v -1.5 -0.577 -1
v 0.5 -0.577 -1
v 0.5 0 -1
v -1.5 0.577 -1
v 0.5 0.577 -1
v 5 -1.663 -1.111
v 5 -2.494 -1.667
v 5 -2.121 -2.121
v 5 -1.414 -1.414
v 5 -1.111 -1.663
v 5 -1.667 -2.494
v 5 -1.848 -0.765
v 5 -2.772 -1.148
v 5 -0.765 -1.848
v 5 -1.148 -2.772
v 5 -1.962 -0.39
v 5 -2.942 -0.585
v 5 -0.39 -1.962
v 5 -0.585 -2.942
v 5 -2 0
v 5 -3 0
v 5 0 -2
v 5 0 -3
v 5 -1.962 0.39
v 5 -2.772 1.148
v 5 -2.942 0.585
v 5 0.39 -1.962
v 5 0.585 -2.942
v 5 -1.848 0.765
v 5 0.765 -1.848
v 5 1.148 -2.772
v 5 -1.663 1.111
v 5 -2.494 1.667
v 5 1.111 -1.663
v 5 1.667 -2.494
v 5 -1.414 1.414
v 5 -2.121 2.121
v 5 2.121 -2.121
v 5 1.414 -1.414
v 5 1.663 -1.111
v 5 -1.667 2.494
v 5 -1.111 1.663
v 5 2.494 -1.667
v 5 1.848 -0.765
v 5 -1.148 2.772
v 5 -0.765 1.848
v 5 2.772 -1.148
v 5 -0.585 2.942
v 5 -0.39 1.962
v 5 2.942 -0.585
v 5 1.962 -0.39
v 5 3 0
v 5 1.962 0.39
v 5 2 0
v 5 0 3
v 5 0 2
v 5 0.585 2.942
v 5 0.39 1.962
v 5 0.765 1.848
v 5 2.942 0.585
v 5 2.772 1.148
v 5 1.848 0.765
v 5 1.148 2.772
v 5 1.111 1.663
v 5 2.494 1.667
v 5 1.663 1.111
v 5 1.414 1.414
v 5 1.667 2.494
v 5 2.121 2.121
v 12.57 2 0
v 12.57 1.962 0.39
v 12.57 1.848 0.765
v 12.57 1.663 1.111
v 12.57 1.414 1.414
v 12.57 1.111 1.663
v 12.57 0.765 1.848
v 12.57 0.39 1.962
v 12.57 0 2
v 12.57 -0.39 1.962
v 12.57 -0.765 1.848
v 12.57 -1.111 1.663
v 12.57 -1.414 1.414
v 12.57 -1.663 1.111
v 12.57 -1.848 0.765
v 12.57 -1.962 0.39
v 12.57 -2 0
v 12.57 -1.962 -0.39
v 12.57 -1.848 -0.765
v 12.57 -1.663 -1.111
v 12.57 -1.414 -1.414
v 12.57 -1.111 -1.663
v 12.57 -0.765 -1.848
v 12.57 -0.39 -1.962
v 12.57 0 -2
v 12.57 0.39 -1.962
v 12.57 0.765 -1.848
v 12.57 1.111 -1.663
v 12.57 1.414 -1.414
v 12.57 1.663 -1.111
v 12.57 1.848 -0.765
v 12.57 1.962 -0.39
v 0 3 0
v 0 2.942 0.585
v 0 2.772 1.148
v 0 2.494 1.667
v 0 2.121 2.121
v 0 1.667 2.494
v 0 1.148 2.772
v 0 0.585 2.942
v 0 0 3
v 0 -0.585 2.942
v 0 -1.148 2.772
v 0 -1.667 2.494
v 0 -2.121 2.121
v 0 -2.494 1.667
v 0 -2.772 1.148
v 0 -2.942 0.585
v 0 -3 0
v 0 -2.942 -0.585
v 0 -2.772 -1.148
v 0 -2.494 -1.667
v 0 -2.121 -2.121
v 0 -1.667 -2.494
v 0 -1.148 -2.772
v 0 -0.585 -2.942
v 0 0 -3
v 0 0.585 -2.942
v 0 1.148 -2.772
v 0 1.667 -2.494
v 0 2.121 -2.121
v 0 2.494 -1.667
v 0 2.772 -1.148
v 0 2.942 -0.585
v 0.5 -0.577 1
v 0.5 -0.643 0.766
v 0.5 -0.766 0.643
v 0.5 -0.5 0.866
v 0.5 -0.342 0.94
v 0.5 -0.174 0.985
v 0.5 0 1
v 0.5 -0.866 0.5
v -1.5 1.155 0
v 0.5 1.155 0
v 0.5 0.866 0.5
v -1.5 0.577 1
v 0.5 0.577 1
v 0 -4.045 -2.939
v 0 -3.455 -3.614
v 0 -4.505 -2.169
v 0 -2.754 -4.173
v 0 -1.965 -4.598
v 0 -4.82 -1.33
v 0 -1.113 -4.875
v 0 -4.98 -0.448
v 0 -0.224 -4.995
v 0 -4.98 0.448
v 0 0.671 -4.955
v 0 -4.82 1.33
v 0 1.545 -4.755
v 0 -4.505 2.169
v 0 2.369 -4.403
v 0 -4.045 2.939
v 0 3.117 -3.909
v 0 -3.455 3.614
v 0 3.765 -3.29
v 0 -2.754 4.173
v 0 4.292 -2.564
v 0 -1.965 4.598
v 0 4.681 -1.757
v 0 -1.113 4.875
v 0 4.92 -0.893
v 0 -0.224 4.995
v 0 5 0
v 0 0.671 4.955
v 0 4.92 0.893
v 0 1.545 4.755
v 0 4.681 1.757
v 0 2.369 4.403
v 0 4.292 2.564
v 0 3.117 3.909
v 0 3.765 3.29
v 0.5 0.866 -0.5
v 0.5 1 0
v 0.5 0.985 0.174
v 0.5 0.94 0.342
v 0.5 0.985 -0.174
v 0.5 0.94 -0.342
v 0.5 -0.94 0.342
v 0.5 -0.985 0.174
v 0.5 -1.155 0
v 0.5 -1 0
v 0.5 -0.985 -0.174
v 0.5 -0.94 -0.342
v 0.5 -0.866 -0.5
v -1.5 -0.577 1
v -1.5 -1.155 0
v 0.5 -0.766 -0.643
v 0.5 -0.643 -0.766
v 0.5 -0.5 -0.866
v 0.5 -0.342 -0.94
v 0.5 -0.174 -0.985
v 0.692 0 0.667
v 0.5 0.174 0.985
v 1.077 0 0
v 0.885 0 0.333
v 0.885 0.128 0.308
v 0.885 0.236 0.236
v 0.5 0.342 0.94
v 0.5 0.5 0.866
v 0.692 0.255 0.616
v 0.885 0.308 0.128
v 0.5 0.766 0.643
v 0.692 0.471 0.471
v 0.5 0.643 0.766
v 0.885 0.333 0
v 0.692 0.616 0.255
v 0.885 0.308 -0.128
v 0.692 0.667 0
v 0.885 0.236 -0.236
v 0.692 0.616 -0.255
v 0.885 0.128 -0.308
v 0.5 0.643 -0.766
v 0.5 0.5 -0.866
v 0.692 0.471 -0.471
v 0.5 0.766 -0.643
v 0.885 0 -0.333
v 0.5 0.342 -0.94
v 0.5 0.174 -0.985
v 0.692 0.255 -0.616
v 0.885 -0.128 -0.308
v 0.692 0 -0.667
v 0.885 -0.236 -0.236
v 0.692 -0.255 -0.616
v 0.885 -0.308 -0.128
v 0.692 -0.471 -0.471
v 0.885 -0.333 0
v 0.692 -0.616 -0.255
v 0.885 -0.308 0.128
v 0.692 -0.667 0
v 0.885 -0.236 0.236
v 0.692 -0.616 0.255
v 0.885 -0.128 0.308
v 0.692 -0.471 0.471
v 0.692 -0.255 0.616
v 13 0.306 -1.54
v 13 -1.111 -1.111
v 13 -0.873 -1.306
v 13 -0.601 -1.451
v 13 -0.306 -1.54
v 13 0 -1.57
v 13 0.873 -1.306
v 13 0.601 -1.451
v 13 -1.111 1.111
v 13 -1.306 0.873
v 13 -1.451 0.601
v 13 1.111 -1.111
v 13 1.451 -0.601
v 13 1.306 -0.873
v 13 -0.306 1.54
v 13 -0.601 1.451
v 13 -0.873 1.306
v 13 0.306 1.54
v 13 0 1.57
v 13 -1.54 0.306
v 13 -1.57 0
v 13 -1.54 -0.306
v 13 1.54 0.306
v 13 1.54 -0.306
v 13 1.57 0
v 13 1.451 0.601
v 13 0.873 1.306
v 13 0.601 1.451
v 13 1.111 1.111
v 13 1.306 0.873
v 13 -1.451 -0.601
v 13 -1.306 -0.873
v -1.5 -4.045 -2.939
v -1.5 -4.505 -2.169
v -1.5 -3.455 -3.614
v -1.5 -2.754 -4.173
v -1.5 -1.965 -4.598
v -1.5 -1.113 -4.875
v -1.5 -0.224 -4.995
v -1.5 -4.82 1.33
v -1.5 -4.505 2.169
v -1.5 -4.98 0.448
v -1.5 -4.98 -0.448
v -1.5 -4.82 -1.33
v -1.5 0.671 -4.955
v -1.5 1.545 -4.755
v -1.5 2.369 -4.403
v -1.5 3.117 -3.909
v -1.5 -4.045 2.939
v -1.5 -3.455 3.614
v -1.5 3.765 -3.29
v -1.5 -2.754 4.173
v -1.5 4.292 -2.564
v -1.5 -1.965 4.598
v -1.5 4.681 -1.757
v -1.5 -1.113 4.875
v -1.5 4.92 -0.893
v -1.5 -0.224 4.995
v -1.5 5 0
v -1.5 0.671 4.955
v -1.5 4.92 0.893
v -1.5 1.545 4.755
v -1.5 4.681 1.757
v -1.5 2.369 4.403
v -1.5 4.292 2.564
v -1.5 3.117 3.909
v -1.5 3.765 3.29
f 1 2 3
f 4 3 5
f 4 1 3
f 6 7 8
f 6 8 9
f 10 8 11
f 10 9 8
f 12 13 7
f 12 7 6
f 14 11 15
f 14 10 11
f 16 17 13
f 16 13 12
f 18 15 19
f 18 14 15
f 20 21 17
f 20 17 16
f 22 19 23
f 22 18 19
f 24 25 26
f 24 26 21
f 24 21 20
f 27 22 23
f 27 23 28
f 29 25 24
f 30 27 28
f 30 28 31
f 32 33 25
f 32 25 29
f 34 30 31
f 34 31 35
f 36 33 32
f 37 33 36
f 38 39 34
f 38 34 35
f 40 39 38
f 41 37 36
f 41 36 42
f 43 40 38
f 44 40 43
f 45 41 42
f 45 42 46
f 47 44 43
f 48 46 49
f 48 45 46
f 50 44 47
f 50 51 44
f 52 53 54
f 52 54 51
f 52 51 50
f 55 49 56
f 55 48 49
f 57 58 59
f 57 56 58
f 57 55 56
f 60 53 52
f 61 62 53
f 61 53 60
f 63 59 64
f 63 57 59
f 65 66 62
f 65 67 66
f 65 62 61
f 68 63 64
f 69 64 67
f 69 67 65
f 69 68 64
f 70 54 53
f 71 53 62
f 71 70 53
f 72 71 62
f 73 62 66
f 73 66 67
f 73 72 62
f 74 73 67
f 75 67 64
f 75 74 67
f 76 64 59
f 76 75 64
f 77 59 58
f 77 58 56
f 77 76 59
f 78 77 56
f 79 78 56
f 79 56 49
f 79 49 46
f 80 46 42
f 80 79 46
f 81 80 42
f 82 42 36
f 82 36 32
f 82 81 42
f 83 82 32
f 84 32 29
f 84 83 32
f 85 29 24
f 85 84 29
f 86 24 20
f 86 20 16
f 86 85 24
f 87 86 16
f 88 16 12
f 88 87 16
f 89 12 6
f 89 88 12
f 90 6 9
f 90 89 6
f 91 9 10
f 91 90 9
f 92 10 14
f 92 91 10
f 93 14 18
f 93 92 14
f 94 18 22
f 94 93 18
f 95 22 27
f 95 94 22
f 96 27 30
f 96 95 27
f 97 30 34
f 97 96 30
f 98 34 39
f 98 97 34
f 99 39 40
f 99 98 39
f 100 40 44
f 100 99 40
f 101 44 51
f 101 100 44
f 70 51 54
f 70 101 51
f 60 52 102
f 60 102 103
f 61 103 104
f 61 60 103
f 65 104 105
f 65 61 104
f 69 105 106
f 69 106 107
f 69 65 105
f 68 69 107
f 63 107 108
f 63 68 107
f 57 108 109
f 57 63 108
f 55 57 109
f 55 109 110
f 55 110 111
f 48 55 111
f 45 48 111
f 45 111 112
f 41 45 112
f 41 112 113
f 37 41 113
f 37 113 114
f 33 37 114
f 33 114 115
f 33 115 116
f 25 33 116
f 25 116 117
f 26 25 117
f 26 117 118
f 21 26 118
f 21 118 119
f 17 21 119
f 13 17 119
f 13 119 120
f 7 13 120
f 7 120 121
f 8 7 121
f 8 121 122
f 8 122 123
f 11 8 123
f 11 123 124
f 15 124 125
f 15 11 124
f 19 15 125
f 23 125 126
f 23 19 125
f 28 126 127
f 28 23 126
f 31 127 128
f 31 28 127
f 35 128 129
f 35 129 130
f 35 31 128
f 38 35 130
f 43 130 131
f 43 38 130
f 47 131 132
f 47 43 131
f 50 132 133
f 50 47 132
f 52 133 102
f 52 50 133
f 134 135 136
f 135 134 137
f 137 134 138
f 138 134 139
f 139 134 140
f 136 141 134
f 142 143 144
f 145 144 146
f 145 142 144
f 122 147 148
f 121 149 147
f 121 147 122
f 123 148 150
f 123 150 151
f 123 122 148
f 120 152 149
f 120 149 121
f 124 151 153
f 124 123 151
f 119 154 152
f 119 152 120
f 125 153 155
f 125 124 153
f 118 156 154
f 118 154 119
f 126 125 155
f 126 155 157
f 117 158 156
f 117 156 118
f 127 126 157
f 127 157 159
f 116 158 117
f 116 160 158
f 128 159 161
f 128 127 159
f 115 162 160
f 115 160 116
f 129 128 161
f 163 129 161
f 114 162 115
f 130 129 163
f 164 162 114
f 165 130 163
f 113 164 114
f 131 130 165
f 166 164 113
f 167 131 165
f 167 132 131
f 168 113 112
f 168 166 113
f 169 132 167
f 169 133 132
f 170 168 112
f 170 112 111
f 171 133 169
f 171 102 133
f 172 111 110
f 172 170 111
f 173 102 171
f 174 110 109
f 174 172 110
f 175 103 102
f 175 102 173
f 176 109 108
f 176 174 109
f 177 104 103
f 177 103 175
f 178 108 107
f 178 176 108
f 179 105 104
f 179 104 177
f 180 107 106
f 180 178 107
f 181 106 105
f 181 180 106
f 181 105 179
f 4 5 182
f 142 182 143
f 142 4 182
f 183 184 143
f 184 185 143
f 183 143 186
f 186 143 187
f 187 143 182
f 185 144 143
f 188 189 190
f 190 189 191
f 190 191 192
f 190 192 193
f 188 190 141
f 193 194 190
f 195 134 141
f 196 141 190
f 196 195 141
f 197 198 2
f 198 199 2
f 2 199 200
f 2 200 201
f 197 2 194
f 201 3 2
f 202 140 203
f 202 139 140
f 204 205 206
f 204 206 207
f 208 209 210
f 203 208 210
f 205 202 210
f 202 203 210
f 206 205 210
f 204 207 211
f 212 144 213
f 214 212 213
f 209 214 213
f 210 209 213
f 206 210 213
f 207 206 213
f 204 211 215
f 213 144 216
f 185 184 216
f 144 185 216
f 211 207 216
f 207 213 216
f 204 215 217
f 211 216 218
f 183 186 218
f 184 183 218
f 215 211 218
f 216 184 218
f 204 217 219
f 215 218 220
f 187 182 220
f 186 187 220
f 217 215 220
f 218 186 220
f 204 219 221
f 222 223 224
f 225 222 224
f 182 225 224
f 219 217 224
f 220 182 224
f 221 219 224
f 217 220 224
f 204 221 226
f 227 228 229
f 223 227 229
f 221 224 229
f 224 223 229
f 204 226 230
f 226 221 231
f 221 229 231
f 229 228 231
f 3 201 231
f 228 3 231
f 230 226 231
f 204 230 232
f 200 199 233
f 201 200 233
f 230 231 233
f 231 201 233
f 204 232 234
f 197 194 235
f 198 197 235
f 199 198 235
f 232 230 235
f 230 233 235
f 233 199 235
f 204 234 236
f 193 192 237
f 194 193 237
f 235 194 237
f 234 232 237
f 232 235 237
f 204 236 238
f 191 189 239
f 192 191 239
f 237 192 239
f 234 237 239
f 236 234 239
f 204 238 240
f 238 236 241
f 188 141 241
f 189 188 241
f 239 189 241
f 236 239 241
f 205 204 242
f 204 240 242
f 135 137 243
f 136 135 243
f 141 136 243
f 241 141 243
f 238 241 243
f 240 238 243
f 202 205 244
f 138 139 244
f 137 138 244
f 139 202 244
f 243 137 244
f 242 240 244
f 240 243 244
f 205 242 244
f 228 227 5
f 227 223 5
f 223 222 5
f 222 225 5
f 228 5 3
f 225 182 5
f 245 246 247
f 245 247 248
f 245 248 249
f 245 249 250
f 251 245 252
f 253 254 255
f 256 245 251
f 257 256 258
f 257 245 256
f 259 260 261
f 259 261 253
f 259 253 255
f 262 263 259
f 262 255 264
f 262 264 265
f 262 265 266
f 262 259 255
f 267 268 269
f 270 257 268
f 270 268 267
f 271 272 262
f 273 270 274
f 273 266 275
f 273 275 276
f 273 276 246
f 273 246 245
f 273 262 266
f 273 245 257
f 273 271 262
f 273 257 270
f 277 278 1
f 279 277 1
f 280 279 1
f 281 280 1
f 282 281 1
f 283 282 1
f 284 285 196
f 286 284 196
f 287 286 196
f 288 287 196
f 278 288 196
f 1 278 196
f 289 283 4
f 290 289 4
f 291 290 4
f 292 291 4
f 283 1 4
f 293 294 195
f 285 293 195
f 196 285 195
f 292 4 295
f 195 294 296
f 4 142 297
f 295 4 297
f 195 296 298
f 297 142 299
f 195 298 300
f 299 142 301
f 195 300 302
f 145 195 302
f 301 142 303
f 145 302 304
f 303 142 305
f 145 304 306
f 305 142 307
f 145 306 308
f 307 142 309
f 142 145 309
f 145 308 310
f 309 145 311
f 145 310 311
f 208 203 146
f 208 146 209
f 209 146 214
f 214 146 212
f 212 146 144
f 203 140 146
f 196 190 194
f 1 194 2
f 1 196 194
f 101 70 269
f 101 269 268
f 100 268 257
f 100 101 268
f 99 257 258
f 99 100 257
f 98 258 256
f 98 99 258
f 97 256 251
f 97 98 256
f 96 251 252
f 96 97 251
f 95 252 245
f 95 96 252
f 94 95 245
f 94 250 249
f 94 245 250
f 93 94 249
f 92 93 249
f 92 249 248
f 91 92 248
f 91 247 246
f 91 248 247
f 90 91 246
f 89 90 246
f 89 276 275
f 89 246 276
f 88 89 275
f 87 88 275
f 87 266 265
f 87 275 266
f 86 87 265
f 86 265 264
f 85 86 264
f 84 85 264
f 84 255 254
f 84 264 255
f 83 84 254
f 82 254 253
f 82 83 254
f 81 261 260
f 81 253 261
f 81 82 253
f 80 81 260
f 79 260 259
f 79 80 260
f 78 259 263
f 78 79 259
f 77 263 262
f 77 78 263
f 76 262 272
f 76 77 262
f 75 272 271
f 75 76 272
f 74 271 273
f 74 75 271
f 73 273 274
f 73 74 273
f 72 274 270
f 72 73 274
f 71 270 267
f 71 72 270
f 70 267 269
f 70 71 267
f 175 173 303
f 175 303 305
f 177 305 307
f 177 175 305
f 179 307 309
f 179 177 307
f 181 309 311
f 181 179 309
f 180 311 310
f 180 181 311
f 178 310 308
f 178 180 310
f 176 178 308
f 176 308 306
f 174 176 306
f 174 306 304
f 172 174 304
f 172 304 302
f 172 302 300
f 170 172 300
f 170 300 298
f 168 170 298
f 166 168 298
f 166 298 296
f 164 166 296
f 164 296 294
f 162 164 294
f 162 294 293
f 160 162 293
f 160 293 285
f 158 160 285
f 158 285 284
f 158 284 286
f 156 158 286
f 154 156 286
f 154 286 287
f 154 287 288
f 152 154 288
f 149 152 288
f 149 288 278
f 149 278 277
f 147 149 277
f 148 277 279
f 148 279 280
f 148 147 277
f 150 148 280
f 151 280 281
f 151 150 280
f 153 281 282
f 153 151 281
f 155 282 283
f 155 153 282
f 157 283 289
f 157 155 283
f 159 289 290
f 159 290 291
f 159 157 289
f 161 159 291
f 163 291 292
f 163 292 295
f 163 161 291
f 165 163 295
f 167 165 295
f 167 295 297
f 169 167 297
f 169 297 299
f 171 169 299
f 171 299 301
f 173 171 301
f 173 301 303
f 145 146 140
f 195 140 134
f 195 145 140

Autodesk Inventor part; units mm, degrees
ref_plane "YZ Plane" through (0, 0, 0) normal (1, 0, 0) x (0, 1, 0)
ref_plane "XZ Plane" through (0, 0, 0) normal (0, 1, 0) x (-1, 0, 0)
ref_plane "XY Plane" through (0, 0, 0) normal (0, 0, 1) x (1, 0, 0)
sketch "Sketch_1" plane through (0, 0, 0) normal (0, 0, 1) x (1, 0, 0)
  line L0 (5, 0) -> (-1.5, 0)
  line L1 (-1.5, 0) -> (-1.5, 5)
  line L2 (-1.5, 5) -> (0, 5)
  line L3 (0, 5) -> (0, 3)
  line L4 (0, 3) -> (5, 3)
  line L5 (5, 3) -> (5, 0)
  line L6 (5, 0) -> (-1.5, 0)
revolve "Revolution1" add sketch "Sketch_1" angle 360 about axis through (5, 0, 0) along (1, 0, 0)
sketch "Sketch2" plane through (-1.5, 0, 0) normal (-1, 0, 0) x (0, 0, 1)
  point P0 (0, 0)
hole "Hole1" at (-1.5, 0, 0) direction (1, 0, 0) diameter 2 depth 2 tip angle 120
sketch "Sketch_3" plane through (-1.5, 0, 0) normal (1, 0, 0) x (0, 0, -1)
  line L0 (-1, -0.5774) -> (0, -1.1547)
  line L1 (0, -1.1547) -> (1, -0.5774)
  line L2 (1, -0.5774) -> (1, 0.5774)
  line L3 (1, 0.5774) -> (0, 1.1547)
  line L4 (0, 1.1547) -> (-1, 0.5774)
  line L5 (-1, 0.5774) -> (-1, -0.5774)
extrude "Extrusion1" cut sketch "Sketch_3" along normal blind 2
sketch "Sketch_4" plane through (0, 0, 0) normal (0, 0, 1) x (1, 0, 0)
  line L0 (13, 0) -> (5, 0)
  line L1 (5, 0) -> (5, 2)
  line L2 (5, 2) -> (12.5705, 2)
  line L3 (12.5705, 2) -> (13, 1.5705)
  line L4 (13, 1.5705) -> (13, 0)
  line L5 (13, 0) -> (5, 0)
revolve "Revolution2" add sketch "Sketch_4" angle 360 about axis through (13, 0, 0) along (1, 0, 0)
thread "Thread1" size "M4x0.7" class "6g" standard "ISO Metric profile" length 6.3705
properties part number "DBGS4-5-8" material "스테인리스스틸"
